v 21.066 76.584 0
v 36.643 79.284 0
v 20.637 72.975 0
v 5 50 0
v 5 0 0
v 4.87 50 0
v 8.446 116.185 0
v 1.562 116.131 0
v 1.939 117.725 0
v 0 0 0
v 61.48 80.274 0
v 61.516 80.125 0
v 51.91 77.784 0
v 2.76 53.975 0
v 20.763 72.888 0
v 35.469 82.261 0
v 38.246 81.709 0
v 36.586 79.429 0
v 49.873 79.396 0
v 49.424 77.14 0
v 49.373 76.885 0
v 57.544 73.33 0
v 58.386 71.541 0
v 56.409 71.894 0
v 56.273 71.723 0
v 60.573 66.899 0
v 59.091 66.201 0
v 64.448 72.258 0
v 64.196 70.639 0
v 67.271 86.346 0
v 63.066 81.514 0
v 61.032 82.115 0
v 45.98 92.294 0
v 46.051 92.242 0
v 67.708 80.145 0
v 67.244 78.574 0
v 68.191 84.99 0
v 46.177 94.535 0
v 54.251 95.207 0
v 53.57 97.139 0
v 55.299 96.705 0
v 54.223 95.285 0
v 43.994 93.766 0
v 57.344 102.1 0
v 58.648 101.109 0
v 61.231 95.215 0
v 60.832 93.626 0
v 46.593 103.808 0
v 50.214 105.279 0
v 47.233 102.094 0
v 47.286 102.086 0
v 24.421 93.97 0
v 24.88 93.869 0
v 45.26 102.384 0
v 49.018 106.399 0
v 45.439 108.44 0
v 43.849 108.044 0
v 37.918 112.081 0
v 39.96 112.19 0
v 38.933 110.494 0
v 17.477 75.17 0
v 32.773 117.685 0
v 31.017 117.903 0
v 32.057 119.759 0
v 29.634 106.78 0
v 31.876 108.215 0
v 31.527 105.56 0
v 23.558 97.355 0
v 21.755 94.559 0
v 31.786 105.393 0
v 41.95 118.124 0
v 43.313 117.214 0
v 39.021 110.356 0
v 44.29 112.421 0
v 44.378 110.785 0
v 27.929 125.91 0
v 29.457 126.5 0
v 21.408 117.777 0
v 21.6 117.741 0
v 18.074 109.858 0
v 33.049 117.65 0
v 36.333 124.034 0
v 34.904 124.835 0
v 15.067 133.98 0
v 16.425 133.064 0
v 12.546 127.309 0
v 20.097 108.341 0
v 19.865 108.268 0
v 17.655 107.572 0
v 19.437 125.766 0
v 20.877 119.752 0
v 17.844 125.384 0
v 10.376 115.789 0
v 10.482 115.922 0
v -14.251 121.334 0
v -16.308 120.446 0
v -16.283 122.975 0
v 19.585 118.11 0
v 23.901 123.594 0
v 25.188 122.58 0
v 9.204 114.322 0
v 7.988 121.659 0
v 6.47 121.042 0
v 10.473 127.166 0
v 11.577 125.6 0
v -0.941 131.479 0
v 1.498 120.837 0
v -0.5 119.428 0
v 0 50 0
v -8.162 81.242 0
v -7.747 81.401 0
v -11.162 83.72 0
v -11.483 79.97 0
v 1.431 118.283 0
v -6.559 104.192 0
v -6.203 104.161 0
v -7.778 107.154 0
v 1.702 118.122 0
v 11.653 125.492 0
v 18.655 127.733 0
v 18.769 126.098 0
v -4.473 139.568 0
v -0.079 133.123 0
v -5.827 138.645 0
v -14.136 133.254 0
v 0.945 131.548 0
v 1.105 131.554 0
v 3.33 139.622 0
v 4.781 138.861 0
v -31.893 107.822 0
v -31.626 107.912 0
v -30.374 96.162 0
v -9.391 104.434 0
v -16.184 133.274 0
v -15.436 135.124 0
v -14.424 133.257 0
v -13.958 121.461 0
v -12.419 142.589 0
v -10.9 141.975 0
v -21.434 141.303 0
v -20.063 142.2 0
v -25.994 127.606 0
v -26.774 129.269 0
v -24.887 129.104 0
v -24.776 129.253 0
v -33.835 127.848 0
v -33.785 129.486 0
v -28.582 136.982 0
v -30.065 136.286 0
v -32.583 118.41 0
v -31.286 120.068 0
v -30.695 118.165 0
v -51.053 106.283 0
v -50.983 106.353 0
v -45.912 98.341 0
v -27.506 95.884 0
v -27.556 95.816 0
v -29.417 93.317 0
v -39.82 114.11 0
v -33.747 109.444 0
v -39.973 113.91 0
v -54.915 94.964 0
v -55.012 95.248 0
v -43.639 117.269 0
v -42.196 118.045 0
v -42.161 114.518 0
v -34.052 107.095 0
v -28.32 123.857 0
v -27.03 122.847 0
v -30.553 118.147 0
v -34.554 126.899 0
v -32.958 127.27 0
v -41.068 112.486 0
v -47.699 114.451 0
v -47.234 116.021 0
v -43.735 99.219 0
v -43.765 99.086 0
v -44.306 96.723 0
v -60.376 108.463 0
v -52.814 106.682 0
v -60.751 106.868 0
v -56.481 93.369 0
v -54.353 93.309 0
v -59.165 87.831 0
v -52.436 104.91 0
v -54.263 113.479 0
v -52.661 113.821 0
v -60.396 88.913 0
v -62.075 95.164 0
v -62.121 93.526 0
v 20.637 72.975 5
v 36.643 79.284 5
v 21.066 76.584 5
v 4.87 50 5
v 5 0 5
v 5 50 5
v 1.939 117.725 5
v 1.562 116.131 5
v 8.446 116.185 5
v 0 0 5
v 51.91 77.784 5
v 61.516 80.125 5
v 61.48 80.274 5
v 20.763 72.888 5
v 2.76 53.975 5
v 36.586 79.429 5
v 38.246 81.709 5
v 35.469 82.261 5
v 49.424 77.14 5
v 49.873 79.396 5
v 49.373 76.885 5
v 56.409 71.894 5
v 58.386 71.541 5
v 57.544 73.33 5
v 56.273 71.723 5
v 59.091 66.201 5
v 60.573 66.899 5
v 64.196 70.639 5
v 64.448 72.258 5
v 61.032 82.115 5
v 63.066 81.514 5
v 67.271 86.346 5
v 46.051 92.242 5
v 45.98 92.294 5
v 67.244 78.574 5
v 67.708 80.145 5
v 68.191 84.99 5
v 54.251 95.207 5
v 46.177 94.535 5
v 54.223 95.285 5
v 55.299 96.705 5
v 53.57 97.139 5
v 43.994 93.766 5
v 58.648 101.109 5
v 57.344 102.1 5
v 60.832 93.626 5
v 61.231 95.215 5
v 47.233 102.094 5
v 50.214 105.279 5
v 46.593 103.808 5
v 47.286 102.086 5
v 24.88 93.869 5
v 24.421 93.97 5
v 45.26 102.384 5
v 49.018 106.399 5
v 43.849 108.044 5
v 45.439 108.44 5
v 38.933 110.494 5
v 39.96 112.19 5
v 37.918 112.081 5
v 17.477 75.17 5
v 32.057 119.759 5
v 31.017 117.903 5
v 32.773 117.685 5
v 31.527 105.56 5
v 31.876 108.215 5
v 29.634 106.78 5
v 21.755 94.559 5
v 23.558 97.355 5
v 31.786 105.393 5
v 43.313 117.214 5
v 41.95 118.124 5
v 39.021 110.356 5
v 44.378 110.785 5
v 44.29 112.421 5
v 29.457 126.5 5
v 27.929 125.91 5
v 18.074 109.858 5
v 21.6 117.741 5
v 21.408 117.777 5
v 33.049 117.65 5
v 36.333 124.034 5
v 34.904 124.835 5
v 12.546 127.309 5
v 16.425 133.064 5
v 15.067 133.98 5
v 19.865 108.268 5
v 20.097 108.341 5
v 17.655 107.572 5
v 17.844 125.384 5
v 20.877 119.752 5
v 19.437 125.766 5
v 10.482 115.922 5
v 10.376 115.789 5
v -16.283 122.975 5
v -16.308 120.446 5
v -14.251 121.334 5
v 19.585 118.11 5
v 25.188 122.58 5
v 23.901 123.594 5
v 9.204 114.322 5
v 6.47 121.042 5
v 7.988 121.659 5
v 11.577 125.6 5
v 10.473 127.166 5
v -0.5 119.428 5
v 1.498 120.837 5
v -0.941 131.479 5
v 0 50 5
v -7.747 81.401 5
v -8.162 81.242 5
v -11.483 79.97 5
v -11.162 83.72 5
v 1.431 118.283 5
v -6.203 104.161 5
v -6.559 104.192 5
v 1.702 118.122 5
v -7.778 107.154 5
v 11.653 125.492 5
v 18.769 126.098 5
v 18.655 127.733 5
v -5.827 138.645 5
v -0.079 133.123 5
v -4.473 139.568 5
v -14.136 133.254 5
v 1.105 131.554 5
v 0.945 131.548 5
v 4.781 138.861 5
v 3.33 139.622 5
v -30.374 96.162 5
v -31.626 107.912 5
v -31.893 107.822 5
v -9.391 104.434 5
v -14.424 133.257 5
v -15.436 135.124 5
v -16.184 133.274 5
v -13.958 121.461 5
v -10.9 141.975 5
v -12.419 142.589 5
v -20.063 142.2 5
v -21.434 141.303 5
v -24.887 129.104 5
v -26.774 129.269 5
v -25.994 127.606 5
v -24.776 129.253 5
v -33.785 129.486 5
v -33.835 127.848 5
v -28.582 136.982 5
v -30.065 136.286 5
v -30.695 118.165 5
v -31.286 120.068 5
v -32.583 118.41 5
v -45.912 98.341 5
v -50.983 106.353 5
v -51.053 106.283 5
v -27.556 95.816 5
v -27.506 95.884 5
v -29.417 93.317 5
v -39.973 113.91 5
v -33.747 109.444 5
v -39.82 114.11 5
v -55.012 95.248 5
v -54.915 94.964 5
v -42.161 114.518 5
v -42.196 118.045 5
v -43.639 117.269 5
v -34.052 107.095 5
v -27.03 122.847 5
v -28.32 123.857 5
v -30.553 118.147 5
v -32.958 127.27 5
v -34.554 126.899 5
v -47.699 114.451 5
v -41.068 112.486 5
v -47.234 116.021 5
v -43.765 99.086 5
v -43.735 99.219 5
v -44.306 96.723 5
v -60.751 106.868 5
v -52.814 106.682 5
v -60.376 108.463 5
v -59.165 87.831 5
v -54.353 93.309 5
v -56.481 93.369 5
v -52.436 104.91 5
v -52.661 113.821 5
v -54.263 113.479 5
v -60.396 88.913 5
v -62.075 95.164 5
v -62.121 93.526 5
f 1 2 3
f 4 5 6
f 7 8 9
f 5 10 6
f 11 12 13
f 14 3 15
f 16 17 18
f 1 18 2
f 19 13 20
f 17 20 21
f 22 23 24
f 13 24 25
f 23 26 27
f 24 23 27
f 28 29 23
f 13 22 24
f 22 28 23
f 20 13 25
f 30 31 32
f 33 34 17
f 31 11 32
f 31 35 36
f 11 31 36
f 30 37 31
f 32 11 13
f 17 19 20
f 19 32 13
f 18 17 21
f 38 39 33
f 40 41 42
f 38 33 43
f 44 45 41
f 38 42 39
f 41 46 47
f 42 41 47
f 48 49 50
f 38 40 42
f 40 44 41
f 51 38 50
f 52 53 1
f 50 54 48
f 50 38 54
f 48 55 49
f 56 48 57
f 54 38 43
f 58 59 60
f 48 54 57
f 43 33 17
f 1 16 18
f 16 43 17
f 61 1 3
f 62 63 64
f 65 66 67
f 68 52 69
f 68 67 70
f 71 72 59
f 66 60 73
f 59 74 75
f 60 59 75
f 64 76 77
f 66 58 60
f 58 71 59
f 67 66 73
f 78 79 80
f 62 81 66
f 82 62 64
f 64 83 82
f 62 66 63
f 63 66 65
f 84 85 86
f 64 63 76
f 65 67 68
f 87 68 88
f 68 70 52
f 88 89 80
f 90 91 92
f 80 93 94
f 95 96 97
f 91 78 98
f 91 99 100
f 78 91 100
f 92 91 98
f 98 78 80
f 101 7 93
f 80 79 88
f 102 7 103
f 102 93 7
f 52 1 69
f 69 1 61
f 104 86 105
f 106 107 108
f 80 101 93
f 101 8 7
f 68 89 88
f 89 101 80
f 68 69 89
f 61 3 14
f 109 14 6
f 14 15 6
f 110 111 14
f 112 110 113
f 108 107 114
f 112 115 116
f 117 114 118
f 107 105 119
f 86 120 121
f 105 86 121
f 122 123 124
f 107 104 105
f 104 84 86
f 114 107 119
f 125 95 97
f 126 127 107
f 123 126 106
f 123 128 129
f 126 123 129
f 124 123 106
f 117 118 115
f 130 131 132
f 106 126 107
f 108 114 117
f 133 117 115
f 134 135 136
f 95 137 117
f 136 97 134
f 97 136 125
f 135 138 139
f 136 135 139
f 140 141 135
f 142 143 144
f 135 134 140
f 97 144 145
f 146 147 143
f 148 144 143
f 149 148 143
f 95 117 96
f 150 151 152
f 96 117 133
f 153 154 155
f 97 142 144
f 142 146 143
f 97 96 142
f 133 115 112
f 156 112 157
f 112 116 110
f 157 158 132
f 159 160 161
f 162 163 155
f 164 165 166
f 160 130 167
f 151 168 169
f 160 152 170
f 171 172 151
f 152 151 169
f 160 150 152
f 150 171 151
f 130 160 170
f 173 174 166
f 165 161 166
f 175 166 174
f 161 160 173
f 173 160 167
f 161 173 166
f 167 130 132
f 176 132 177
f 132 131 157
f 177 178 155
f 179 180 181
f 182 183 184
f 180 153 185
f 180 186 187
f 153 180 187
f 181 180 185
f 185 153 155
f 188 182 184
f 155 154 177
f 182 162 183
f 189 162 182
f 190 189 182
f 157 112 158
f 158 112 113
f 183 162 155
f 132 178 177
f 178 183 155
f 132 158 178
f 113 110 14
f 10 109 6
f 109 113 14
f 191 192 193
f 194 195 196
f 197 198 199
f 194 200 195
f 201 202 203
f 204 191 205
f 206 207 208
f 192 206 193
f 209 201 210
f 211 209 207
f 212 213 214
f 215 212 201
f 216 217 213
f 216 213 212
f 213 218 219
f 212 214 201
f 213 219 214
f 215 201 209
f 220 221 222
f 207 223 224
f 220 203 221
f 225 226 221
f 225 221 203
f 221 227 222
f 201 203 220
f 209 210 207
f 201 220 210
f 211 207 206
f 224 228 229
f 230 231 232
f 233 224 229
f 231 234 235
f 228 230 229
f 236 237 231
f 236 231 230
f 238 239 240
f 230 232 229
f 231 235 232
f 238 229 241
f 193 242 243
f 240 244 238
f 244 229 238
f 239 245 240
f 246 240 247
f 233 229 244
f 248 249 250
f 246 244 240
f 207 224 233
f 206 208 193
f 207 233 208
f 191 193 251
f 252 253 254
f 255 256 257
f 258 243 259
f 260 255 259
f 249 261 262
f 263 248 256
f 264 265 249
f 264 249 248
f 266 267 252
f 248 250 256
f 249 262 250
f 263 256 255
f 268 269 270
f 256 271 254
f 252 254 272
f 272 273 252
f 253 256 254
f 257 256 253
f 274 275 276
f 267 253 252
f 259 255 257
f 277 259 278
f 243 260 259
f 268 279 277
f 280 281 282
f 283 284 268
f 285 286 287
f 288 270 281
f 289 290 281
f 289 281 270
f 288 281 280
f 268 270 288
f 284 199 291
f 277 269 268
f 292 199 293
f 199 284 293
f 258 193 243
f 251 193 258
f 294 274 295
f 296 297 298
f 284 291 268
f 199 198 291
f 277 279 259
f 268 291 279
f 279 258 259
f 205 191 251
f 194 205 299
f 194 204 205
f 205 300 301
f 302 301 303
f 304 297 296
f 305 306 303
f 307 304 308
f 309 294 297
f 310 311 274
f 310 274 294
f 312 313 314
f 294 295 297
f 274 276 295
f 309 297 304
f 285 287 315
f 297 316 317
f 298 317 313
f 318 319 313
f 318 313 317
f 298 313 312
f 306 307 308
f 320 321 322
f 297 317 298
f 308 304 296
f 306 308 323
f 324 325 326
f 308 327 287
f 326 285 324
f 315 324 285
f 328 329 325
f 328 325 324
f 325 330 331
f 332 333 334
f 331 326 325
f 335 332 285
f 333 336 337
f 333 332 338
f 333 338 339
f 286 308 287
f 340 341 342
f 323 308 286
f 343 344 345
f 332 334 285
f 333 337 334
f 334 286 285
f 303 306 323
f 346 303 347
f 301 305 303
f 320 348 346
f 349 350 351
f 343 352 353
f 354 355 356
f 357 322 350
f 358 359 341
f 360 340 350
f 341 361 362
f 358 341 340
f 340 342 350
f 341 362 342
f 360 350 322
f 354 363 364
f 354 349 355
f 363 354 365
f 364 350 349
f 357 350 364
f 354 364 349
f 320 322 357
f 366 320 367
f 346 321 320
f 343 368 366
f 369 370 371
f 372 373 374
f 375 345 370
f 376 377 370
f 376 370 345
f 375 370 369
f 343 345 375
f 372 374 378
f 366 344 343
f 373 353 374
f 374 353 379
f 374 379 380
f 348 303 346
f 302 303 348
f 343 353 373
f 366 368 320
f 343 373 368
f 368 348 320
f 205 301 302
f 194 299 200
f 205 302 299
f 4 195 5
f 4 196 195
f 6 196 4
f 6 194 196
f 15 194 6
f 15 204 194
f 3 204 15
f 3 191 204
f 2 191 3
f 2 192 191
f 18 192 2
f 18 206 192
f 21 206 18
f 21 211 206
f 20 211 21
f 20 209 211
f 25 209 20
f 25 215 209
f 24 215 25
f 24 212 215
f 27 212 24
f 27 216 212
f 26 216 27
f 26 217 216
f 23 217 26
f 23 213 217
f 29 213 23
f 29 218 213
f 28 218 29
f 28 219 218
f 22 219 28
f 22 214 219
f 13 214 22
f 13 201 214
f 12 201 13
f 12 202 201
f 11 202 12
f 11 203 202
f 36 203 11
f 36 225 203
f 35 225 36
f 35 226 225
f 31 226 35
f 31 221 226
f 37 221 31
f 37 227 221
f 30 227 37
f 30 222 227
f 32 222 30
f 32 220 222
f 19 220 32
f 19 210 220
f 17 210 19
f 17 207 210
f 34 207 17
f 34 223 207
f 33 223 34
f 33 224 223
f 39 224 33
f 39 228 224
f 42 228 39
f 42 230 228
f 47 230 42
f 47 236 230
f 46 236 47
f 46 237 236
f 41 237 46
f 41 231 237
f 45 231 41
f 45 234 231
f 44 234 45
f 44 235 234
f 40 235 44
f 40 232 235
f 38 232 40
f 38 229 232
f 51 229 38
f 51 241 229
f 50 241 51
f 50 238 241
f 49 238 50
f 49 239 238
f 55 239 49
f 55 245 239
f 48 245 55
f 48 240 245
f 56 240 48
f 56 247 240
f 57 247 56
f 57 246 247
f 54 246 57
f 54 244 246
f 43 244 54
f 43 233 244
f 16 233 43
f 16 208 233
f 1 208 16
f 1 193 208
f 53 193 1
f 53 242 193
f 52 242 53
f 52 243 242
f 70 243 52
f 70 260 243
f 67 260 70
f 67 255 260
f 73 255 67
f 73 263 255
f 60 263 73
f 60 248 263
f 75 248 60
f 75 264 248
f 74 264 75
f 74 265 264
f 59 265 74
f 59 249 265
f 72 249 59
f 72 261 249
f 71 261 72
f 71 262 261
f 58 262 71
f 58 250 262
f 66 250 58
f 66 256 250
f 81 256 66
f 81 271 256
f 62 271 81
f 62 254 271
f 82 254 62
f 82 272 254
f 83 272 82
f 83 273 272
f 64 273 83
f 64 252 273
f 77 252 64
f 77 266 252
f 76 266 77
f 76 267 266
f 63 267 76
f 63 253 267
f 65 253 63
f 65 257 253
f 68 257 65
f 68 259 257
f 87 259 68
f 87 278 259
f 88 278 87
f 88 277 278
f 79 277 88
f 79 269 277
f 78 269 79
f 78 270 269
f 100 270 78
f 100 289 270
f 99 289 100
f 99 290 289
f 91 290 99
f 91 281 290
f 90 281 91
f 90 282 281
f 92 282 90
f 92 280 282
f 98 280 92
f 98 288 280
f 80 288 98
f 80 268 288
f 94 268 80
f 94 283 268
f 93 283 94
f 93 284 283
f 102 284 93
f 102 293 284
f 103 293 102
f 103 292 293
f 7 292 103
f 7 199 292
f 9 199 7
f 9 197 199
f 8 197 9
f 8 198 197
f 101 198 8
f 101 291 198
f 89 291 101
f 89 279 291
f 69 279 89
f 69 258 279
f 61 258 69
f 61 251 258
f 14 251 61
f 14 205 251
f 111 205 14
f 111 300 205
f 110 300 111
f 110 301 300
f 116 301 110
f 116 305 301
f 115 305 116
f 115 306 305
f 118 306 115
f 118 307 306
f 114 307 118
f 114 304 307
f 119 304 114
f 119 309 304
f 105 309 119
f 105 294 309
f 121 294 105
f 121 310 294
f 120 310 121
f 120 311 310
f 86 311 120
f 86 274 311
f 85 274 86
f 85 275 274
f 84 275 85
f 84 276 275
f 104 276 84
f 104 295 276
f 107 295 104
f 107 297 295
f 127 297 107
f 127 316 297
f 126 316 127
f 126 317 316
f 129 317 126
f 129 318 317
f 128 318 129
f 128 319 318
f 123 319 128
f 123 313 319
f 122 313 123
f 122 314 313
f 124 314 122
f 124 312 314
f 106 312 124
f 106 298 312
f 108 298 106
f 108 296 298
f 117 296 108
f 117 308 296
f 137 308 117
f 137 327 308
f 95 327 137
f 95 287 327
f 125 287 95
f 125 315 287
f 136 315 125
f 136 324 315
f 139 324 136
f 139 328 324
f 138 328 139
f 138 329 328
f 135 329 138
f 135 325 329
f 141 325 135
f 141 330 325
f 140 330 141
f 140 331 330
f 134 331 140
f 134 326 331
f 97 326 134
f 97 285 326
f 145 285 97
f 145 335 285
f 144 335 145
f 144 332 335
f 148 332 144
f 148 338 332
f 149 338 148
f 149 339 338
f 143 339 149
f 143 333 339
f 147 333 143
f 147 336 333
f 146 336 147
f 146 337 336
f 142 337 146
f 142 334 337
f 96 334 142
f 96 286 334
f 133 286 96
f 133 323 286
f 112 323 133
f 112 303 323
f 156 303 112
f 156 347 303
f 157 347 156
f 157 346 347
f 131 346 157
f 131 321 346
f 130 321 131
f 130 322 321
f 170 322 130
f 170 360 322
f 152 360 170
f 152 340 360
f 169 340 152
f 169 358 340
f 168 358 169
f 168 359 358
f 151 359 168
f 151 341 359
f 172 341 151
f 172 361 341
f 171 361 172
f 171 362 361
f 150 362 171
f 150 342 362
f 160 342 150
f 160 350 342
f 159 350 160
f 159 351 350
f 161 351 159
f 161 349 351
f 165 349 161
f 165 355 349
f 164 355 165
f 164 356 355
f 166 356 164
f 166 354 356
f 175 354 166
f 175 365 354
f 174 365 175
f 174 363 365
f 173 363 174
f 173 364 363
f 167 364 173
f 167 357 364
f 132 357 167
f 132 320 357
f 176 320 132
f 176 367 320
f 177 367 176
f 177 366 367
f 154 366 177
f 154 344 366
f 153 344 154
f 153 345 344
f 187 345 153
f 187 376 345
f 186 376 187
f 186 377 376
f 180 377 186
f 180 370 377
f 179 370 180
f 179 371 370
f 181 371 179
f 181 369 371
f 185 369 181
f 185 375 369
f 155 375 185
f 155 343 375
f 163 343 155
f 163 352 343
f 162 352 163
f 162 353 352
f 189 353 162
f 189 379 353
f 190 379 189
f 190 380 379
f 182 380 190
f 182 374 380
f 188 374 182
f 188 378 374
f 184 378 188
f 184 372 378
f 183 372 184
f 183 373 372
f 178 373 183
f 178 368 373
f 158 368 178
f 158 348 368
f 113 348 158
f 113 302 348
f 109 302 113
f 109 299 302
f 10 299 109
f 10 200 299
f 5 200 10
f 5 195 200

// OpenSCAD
//number of brenches
levels = 5; 
// length of the first segment in mm
len = 50; 
// thickness of the first segment
thickness = 5; 
//heigh of thewhle tree
height = 5;
//a random number wich determines the position of the trees
random_number = 6;//[-100000,100000]
identity = [ [ 1, 0, 0, 0 ], [ 0, 1, 0, 0 ], [ 0, 0, 1, 0 ], [ 0, 0, 0, 1 ] ];

rcnt = 1000;
random = rands(0, 1, rcnt, random_number);
function rnd(s, e, r) = random[r % rcnt] * (e - s) + s;

// generate 4x4 translation matrix
function mt(x, y) = [ [ 1, 0, 0, x ], [ 0, 1, 0, y ], [ 0, 0, 1, 0 ], [ 0, 0, 0, 1 ] ];

// generate 4x4 rotation matrix around Z axis
function mr(a) = [ [ cos(a), -sin(a), 0, 0 ], [ sin(a), cos(a), 0, 0 ], [ 0, 0, 1, 0 ], [ 0, 0, 0, 1 ] ];

module tree(length, thickness, count, m = identity, r = 1) {
    color([0, 1 - (0.8 / levels * count), 0])
        multmatrix(m)
            square([thickness, length]);

    if (count > 0) {
        tree(rnd(0.6, 0.8, r) * length, 0.8 * thickness, count - 1, m * mt(0, length) * mr(rnd(20, 35, r + 1)), 8 * r);
        tree(rnd(0.6, 0.8, r + 1) * length, 0.8 * thickness, count - 1, m * mt(0, length) * mr(-rnd(20, 35, r + 3)), 8 * r + 4);
    }
}

linear_extrude(height = height){
    tree(len, thickness, levels);
}
